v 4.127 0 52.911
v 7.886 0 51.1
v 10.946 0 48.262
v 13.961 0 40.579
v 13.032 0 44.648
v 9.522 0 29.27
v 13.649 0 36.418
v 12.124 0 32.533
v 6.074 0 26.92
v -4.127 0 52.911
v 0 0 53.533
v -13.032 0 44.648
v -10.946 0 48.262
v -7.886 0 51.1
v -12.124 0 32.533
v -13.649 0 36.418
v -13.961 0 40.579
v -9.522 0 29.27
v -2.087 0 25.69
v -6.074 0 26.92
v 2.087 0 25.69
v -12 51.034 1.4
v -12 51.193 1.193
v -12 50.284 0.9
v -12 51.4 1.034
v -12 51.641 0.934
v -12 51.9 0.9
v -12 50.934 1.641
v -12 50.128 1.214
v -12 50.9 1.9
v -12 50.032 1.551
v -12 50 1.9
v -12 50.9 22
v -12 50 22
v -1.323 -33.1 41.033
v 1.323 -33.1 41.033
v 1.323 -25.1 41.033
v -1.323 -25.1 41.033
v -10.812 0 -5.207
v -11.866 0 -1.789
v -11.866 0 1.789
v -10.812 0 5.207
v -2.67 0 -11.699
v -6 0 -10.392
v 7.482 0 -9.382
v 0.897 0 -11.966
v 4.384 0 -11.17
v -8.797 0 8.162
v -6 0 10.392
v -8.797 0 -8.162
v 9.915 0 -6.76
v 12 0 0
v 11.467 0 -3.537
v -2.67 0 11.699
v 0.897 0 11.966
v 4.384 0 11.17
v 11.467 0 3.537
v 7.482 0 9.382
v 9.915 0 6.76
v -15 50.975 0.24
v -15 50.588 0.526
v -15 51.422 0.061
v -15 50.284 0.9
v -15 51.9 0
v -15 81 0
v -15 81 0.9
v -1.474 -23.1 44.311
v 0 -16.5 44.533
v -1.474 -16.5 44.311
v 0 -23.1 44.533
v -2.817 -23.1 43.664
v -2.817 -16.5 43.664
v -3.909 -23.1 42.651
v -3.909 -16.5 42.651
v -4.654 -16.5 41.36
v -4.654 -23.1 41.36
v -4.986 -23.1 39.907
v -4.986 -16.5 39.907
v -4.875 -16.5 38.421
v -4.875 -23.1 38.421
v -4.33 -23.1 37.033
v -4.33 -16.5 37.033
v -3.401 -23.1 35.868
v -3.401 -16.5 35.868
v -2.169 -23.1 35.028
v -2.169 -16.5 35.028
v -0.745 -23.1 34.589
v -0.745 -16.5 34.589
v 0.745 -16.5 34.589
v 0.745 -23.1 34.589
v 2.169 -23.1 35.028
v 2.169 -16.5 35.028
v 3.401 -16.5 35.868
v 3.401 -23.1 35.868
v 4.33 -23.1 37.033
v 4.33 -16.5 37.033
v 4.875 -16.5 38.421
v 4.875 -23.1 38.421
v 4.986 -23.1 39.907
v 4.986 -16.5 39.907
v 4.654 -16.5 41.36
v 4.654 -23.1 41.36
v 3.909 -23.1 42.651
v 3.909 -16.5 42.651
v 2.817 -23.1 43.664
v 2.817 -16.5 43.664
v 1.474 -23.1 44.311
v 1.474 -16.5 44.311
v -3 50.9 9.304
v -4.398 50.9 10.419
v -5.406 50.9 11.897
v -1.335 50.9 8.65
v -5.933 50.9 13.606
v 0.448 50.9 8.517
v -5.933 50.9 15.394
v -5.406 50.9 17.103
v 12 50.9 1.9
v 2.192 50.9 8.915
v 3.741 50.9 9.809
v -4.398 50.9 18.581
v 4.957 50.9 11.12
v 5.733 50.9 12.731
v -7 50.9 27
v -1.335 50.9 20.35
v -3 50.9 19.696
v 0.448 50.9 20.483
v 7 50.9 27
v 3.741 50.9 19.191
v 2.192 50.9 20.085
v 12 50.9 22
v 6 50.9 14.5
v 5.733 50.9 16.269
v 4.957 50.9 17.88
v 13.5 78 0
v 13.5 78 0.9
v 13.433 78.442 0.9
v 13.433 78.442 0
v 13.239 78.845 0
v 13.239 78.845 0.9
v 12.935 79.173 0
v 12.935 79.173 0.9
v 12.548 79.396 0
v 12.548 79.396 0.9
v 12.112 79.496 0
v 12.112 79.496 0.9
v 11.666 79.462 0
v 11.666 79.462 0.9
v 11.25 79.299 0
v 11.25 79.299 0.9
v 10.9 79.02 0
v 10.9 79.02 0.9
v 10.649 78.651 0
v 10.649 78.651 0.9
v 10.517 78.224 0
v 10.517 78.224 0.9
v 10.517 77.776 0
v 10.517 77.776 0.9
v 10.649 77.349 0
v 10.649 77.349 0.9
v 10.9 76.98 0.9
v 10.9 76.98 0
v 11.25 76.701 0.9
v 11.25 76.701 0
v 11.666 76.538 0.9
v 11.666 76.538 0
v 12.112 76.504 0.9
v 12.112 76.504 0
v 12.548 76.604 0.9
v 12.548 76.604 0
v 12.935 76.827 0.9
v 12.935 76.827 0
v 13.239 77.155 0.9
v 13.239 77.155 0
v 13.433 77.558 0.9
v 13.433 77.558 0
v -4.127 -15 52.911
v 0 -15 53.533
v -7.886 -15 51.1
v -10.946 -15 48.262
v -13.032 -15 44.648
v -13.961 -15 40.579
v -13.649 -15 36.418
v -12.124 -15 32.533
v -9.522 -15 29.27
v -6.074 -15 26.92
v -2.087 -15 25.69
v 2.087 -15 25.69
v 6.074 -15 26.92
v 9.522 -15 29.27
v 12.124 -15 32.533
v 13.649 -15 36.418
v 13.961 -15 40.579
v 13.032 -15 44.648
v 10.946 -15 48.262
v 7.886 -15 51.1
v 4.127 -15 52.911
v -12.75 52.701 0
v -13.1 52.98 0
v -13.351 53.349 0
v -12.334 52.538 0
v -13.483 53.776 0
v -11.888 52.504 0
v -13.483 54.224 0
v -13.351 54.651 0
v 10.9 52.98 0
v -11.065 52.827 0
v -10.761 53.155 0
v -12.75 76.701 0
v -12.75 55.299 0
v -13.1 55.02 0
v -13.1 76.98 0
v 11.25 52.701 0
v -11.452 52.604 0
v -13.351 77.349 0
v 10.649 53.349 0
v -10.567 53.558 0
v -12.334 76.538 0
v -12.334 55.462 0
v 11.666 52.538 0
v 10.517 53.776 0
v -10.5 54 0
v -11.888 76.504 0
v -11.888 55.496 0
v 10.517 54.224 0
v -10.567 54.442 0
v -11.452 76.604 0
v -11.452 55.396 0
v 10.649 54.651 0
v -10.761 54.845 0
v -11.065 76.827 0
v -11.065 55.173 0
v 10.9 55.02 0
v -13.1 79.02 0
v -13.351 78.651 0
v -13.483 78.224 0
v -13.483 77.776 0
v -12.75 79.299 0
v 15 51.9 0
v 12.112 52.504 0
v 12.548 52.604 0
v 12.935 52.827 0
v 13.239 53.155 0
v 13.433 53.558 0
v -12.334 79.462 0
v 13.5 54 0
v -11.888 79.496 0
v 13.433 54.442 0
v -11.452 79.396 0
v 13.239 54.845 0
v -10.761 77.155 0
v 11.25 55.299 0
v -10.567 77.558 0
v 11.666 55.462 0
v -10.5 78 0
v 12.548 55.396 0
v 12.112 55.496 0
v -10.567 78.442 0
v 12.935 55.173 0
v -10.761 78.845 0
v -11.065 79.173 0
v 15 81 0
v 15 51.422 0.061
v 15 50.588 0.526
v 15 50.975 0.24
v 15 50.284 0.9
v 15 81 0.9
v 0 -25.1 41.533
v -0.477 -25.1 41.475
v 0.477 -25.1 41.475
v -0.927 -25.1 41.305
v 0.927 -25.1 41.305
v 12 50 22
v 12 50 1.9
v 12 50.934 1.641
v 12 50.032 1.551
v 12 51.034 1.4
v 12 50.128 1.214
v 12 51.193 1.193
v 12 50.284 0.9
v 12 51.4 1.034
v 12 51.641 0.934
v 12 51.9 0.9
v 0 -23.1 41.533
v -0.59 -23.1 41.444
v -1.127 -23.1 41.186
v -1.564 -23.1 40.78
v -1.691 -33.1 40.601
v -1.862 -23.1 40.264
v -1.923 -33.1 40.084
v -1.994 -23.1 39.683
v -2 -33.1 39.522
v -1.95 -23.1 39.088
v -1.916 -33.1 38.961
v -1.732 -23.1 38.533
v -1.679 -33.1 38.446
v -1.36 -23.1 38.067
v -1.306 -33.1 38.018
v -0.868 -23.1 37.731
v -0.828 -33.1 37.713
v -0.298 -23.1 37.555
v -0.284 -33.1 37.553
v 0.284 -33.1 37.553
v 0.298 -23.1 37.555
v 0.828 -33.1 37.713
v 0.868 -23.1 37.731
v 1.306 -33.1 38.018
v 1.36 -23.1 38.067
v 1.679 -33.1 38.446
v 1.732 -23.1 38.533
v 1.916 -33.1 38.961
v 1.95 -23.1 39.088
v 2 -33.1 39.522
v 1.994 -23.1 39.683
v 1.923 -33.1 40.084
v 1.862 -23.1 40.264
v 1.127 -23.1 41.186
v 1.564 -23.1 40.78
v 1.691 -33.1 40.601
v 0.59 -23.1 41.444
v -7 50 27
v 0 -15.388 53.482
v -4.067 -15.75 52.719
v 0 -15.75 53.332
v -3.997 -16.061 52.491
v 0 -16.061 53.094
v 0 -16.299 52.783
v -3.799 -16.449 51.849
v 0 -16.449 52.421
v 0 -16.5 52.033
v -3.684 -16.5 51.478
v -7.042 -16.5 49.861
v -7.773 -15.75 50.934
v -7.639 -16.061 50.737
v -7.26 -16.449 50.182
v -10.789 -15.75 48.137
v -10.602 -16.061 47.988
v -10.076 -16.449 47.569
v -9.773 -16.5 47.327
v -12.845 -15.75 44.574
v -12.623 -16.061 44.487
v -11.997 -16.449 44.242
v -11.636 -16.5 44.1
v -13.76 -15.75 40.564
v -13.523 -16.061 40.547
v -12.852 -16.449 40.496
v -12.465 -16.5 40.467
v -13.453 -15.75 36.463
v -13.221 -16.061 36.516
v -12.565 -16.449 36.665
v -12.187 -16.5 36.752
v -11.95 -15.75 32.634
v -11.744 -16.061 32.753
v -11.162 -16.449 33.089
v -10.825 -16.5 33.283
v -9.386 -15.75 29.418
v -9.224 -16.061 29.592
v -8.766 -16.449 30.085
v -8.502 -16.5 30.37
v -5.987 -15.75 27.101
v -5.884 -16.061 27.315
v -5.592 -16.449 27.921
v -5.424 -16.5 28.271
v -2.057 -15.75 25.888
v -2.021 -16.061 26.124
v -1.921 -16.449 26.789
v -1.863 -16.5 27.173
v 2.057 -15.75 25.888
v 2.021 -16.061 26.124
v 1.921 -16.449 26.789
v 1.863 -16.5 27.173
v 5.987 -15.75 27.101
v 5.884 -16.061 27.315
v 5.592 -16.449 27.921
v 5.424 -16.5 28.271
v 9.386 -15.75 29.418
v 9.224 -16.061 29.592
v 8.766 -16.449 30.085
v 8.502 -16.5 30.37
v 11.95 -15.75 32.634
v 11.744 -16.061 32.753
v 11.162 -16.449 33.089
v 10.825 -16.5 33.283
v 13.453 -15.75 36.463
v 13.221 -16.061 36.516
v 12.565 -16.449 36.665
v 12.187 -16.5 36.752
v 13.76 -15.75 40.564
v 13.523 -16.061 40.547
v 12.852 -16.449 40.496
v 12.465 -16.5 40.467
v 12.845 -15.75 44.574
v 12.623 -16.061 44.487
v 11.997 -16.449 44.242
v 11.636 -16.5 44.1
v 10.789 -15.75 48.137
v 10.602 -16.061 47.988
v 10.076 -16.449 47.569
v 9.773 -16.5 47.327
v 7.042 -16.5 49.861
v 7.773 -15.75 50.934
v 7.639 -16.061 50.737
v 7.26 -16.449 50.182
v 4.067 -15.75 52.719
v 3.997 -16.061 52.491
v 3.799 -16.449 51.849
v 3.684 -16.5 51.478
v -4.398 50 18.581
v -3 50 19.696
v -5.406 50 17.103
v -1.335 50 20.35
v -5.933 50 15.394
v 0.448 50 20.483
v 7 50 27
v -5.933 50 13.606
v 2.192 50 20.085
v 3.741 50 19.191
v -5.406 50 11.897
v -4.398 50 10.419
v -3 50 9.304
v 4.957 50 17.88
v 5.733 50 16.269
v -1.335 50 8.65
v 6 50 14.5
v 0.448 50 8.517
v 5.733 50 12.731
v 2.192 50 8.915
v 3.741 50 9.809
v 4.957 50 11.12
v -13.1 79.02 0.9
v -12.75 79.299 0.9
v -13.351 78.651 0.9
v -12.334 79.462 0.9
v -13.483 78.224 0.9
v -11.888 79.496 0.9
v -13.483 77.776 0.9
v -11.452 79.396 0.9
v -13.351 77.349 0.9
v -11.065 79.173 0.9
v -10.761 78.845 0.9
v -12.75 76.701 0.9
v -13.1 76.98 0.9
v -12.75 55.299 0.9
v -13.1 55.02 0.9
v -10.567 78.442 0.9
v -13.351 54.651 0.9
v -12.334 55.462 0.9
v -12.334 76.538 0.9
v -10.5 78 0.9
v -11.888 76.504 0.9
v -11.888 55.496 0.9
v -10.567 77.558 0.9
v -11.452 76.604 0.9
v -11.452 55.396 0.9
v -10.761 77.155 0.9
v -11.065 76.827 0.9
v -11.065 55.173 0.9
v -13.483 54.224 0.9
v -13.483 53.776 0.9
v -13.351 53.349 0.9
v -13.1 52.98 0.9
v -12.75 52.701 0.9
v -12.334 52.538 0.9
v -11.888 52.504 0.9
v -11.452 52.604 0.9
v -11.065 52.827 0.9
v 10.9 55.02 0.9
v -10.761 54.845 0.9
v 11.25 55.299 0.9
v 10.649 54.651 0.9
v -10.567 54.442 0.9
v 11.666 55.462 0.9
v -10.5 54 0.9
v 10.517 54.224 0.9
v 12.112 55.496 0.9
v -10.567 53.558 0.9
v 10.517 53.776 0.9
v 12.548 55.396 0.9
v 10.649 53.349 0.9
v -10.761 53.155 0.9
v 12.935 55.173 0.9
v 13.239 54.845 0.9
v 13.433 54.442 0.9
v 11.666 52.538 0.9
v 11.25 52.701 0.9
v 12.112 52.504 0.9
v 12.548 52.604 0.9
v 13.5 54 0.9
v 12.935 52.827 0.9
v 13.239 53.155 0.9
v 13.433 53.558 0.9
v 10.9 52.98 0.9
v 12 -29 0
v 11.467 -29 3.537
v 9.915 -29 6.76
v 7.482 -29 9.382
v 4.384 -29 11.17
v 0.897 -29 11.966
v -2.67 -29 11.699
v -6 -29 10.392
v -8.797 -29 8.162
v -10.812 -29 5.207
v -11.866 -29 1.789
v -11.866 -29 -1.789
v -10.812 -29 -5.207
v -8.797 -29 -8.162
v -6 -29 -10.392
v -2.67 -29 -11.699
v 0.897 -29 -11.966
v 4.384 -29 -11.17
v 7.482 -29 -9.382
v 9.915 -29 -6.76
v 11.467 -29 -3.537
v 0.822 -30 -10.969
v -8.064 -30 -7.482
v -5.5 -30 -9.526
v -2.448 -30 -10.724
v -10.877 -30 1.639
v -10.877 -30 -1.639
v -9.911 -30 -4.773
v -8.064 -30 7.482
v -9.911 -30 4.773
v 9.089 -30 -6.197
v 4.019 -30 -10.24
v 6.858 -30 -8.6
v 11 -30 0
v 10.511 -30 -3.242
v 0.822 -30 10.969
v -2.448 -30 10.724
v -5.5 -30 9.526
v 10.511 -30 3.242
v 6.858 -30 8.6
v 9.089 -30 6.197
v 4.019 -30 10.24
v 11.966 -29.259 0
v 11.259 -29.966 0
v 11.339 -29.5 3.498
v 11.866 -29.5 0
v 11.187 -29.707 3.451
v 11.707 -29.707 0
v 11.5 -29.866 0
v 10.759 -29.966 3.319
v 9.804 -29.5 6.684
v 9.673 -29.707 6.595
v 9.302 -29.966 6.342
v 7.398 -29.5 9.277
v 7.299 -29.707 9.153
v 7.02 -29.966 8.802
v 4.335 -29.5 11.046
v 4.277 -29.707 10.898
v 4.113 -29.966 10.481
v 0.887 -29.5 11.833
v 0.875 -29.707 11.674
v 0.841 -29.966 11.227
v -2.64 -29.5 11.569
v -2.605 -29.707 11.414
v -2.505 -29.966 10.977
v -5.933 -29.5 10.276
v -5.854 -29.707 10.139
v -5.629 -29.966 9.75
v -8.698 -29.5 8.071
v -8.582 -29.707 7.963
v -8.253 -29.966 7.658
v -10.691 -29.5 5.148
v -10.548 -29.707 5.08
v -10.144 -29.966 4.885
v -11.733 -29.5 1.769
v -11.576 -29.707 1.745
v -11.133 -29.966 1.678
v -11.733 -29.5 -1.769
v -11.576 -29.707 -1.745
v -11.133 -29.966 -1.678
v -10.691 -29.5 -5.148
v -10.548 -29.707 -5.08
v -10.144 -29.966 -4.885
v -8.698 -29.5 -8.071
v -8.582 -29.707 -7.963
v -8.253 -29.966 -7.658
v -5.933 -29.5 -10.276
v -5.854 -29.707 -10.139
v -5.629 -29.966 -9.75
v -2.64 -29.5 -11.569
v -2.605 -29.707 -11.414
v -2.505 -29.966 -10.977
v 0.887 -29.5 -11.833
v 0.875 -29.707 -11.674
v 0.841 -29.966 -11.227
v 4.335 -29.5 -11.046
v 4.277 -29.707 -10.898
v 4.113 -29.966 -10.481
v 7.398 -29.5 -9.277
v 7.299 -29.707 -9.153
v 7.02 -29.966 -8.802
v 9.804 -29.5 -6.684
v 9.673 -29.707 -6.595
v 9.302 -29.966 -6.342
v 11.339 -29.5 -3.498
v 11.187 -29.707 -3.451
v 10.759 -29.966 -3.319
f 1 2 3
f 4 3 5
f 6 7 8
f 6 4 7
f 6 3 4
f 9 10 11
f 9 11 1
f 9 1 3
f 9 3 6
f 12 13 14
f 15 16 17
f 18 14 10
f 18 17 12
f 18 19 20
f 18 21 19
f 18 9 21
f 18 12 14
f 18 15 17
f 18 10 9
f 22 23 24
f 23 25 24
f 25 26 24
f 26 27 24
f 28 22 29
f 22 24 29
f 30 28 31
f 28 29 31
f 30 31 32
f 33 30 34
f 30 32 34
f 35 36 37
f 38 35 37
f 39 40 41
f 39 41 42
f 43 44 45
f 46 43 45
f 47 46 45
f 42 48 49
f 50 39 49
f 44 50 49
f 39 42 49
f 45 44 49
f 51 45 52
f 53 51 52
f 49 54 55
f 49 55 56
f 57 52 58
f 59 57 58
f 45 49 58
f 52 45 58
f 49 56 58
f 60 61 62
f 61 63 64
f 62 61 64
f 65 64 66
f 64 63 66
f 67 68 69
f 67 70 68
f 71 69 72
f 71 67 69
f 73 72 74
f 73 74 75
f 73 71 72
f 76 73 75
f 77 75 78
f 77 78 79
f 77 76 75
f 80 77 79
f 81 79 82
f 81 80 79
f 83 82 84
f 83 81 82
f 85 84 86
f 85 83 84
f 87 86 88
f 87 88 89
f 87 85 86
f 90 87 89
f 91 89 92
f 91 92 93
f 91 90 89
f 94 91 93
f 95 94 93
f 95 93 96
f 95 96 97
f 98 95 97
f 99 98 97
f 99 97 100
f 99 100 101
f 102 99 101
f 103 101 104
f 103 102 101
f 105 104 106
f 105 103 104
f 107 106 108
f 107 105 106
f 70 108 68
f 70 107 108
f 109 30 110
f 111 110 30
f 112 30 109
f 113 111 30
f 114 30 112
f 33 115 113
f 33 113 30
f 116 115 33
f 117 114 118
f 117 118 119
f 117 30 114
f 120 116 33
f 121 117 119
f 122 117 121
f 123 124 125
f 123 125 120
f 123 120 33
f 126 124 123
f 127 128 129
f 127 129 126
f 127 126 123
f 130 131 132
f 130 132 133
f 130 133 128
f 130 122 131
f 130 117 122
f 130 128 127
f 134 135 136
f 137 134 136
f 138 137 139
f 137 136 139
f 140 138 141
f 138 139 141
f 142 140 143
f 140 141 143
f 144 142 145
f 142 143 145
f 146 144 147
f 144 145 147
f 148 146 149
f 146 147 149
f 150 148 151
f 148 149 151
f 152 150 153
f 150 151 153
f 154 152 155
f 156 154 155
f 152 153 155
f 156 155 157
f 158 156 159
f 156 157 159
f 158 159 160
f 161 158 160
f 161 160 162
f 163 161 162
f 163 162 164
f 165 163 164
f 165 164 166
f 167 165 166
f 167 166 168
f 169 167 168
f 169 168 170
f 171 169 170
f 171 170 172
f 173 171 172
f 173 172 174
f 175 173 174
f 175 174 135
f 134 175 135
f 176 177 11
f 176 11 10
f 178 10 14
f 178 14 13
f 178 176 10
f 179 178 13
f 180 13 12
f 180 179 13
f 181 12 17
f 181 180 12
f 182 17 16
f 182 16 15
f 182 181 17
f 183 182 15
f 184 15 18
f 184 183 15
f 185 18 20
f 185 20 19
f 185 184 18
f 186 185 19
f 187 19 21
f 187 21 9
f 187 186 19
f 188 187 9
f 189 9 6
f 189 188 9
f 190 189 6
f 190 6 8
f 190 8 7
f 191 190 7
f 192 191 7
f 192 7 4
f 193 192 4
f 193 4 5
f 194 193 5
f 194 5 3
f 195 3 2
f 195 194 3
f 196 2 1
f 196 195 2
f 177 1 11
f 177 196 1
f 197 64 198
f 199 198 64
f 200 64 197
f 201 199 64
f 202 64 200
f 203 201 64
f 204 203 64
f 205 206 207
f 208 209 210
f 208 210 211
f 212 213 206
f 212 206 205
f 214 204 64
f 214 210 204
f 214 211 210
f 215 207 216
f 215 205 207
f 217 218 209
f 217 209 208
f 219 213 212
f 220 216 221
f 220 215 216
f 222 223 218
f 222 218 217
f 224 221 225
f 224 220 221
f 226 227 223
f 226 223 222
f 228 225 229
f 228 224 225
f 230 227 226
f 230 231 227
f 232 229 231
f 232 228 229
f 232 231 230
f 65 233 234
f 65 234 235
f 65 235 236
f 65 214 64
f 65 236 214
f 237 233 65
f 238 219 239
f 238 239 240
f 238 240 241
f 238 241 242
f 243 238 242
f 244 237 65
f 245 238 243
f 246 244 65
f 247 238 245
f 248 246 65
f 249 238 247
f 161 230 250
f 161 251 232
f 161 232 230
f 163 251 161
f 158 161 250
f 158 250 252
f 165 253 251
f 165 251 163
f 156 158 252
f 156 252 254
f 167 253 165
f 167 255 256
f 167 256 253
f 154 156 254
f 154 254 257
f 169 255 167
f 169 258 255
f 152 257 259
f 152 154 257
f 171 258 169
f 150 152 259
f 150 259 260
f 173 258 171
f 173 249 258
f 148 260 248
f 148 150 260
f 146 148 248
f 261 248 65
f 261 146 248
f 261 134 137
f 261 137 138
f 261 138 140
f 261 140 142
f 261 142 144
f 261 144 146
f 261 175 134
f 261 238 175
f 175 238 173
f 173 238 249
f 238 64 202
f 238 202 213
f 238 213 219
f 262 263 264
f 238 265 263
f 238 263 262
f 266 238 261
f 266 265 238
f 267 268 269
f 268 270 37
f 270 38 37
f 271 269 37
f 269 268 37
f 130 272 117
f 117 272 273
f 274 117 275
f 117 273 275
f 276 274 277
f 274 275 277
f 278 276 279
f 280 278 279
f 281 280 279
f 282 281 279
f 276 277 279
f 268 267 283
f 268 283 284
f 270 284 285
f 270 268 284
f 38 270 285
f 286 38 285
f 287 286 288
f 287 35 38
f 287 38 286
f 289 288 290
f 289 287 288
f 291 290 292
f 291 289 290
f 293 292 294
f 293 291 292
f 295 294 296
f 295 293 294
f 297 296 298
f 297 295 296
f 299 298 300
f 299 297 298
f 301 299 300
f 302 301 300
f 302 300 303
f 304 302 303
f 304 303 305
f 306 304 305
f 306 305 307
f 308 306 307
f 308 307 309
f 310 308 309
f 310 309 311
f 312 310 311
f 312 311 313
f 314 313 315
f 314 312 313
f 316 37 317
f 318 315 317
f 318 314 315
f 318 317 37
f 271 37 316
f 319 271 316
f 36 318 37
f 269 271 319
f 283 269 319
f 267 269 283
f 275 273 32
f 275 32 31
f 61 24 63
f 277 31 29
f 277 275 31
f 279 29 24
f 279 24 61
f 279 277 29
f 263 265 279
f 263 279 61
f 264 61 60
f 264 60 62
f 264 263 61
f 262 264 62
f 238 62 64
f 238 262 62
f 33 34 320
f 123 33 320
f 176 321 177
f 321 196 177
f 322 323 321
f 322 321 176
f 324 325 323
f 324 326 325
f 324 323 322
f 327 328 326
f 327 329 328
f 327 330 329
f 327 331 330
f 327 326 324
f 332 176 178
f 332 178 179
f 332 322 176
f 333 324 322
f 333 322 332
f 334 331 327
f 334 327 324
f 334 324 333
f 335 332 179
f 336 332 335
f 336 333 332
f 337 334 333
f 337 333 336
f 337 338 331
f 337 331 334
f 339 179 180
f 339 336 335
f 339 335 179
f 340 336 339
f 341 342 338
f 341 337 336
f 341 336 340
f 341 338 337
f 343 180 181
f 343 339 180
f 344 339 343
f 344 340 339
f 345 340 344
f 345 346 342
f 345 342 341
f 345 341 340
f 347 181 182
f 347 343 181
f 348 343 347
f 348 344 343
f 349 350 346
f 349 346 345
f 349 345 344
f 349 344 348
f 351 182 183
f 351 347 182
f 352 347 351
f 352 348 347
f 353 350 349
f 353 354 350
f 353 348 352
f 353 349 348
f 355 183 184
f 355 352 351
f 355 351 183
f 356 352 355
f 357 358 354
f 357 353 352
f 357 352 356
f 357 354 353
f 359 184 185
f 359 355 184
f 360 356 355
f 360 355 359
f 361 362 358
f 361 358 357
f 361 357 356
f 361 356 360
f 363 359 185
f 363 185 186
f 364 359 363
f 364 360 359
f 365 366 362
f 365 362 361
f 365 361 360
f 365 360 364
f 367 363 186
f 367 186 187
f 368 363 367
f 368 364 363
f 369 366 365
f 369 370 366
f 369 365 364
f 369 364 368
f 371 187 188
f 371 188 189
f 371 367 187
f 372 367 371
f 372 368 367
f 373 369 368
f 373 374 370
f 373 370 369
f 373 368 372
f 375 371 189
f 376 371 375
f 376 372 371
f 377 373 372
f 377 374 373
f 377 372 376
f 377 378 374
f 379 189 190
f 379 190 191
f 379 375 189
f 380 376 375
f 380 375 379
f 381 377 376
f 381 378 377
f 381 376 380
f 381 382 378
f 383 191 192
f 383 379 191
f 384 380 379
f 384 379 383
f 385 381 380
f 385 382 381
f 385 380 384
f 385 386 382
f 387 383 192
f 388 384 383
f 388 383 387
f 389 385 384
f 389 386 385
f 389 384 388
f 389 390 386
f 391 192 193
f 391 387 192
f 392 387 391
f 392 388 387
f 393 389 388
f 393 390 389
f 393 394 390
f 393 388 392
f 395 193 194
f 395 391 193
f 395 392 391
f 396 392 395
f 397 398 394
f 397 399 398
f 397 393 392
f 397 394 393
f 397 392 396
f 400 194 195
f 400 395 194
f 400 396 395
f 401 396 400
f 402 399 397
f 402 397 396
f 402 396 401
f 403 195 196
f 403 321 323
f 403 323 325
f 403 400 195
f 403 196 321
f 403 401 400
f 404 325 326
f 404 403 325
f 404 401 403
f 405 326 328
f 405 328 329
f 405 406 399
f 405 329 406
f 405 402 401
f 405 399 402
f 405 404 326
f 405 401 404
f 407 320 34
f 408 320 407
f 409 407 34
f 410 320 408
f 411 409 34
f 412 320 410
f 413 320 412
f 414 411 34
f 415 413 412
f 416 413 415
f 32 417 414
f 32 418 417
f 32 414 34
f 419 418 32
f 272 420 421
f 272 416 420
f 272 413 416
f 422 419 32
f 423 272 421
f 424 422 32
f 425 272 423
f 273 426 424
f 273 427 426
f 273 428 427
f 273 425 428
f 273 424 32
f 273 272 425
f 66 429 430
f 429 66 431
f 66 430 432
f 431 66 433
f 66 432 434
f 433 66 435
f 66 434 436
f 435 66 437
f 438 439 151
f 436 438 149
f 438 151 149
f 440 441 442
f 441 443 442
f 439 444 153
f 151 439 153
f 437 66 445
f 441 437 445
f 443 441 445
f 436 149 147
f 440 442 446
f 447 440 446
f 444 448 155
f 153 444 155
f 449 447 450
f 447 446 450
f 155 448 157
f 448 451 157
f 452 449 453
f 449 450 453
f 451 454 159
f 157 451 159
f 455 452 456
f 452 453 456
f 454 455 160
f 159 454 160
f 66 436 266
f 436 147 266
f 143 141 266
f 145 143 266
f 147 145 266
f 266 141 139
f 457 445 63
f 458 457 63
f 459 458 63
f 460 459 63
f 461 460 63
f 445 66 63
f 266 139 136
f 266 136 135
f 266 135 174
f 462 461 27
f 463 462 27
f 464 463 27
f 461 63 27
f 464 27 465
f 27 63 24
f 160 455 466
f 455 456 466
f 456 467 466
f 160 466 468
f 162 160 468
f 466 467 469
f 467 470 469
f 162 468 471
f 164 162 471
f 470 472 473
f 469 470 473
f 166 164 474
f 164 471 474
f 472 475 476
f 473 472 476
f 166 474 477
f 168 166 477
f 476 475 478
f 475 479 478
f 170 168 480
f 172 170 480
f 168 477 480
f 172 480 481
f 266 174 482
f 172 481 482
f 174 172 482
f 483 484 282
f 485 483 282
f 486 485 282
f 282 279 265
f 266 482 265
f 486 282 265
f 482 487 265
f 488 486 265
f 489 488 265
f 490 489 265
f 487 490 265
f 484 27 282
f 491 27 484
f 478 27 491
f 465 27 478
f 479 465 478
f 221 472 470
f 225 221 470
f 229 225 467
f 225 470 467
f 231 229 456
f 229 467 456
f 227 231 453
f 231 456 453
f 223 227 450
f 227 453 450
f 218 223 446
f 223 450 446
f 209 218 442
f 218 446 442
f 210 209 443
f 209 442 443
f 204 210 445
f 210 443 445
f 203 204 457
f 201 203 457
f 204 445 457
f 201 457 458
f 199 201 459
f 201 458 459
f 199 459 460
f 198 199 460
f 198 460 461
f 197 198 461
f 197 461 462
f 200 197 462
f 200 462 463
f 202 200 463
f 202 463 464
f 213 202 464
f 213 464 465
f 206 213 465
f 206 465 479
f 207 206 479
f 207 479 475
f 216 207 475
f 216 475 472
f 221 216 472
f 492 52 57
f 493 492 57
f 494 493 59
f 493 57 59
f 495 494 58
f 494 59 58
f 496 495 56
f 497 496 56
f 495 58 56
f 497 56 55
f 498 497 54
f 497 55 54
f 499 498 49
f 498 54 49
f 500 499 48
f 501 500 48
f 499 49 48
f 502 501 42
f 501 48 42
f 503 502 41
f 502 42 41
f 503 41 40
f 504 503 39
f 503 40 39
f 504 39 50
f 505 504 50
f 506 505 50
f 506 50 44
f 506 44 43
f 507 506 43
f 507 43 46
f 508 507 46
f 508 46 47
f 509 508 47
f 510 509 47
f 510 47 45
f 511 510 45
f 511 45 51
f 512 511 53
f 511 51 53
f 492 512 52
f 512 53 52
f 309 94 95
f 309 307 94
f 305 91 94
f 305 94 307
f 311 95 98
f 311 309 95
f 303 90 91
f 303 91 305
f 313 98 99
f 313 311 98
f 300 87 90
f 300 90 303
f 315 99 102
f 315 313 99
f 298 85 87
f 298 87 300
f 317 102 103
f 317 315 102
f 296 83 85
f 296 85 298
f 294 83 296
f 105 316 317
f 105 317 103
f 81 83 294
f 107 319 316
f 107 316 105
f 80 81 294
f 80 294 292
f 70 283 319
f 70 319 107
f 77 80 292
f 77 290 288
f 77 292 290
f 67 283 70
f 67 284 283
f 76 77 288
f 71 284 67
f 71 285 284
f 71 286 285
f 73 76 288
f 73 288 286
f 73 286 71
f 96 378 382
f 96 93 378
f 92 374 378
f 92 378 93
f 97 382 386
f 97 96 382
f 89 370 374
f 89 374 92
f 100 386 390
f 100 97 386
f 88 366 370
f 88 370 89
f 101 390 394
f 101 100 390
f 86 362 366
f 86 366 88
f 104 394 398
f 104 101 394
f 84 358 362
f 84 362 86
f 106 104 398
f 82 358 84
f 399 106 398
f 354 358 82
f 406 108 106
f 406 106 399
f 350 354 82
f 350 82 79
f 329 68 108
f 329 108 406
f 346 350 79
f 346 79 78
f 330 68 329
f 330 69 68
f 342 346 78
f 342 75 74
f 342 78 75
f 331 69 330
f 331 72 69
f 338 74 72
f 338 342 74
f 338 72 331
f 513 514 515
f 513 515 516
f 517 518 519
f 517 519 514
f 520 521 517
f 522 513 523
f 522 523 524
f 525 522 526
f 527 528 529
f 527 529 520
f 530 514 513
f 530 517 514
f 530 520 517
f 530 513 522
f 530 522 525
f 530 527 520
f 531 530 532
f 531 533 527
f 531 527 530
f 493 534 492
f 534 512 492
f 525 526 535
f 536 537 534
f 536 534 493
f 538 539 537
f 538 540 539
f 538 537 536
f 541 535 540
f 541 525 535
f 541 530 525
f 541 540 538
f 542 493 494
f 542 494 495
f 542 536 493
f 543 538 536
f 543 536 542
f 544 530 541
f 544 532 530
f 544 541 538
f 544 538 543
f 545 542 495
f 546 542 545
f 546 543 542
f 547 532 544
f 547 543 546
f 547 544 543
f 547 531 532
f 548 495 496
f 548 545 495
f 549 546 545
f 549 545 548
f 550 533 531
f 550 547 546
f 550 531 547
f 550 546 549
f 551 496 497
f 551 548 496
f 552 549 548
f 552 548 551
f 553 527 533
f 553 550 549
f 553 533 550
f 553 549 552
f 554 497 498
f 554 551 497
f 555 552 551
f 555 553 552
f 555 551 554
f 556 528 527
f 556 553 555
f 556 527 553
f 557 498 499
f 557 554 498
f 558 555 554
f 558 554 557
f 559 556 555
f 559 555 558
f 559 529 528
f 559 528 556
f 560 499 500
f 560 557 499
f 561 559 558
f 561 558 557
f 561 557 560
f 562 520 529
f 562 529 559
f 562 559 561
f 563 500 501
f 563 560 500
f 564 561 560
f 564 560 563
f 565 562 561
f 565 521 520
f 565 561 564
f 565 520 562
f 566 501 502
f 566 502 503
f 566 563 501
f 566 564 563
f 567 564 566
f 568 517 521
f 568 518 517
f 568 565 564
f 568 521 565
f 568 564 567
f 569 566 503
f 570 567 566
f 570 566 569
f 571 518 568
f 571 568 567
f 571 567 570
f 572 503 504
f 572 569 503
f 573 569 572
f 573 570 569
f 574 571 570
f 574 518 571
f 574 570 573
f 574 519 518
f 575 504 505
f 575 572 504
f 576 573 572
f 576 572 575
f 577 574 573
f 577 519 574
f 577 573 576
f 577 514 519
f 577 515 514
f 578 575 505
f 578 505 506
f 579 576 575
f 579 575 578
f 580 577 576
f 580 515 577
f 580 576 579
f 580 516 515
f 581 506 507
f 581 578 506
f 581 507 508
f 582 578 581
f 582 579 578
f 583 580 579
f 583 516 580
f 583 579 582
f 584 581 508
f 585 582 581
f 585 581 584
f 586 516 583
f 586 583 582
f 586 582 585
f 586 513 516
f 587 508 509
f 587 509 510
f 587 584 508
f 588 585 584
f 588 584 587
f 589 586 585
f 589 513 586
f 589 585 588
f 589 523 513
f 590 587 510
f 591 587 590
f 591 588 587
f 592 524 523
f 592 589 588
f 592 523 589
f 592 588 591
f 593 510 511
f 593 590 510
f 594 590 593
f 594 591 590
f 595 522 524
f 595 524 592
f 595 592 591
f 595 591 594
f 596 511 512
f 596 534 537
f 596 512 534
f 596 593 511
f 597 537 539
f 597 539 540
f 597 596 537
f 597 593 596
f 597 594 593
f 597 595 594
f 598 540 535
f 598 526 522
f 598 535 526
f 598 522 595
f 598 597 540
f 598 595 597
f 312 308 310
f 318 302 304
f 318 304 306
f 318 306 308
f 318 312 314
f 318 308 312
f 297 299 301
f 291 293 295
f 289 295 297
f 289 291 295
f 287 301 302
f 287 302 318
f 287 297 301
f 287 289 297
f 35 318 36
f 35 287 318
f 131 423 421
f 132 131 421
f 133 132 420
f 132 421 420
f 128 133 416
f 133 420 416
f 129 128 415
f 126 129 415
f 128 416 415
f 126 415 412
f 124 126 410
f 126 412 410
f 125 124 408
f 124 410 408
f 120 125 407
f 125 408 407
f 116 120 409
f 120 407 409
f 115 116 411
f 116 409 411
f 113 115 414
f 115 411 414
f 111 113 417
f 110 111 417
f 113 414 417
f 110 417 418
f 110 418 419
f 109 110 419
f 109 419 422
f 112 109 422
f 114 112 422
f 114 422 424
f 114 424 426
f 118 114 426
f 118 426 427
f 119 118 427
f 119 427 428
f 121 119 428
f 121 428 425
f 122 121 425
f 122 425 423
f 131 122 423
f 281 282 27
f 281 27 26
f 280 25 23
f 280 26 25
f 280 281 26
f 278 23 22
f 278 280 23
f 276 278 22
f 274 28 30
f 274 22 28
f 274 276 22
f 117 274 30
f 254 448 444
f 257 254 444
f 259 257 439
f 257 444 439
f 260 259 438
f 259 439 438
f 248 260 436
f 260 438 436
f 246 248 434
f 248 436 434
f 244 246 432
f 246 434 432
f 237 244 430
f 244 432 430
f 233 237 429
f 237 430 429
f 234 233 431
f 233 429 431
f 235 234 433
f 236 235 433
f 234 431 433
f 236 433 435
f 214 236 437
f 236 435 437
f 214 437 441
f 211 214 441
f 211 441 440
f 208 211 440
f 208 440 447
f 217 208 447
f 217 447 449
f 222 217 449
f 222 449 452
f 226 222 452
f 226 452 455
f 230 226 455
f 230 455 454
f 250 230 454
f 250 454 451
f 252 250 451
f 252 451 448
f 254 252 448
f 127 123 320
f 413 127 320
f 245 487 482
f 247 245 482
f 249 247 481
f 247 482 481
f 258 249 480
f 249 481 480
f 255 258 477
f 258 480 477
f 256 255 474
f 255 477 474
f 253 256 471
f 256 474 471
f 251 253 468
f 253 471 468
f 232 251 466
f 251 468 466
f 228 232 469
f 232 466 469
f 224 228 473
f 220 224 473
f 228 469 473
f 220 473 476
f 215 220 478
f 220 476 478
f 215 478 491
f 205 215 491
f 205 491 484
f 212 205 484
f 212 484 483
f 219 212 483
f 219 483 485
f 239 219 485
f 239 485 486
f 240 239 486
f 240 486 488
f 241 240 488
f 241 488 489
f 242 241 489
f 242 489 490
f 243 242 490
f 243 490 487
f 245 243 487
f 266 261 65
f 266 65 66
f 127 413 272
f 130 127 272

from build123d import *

# Parameters (mm, degrees)
F0_R      = 12
F1_DEPTH  = 30
F2_R      = 1
F4_DEPTH  = 15
F5_R      = 1.5
F6_DEPTH  = 12.901
F7_W      = 3
F7_H      = 1
F7_R      = 6
F8_DEPTH  = 31.001
F10_W     = 8
F10_H     = 0.5
F11_DEPTH = 12.5
F12_R     = 1.5


with BuildPart() as f1:
    # F0 (on Front) → F1 (new body)
    with BuildSketch(Plane.XZ):
        Circle(F0_R)
    extrude(amount=F1_DEPTH)

    # F2
    f2_edges = [f1.edges().sort_by_distance(p)[0] for p in [
        (-12, -30, 0),
    ]]
    fillet(f2_edges, radius=F2_R)


with BuildPart() as f4:
    # F3 (on Right) → F4 (new body, symmetric)
    with BuildSketch(Plane.YZ):
        with BuildLine():
            Line((51.9, 0), (81, 0))
            Line((81, 0), (81, 0.9))
            Line((81, 0.9), (51.9, 0.9))
            ThreePointArc((51.9, 0.9), (51.1928932188, 1.1928932188), (50.9, 1.9))
            Line((50.9, 1.9), (50.9, 27))
            Line((50.9, 27), (50, 27))
            Line((50, 27), (50, 1.9))
            ThreePointArc((50, 1.9), (50.5564971157, 0.5564971157), (51.9, 0))
        make_face()
    extrude(amount=F4_DEPTH, both=True)

    # F5 (on face) → F6 (cut, through all)
    with BuildSketch(Plane.XY.offset(0.9)):
        with Locations((-12, 78)):
            Circle(F5_R)
        with Locations((12, 78)):
            Circle(F5_R)
        with Locations((-12, 54)):
            Circle(F5_R)
        with Locations((12, 54)):
            Circle(F5_R)
    extrude(amount=-F6_DEPTH, mode=Mode.SUBTRACT)

    # F7 (on face) → F8 (cut, through all)
    with BuildSketch(Plane.XZ.offset(-50)):
        Polygon((-7, 27), (-15, 27), (-15, 1.9), (-12, 1.9), (-12, 22), align=None)
        Polygon((15, 27), (7, 27), (12, 22), (12, 1.9), (15, 1.9), align=None)
        with Locations((-13.5, 1.4)):
            Rectangle(F7_W, F7_H)
        with Locations((13.5, 1.4)):
            Rectangle(F7_W, F7_H)
        with Locations((0, 14.5)):
            Circle(F7_R)
    extrude(amount=-F8_DEPTH, mode=Mode.SUBTRACT)


with BuildPart() as f9:
    # F3 (on Right) → F9 (revolve)
    with BuildSketch(Plane.YZ):
        Polygon((-33.1, 39.5331345499), (0, 39.5331345499), (0, 53.5331345499), (-16.5, 53.5331345499), (-16.5, 44.5331345499), (-23.1, 44.5331345499), (-23.1, 41.5331345499), (-33.1, 41.5331345499), align=None)
    revolve(axis=Axis((0, -16.55, 39.5331345499), (0, -1, 0)))

    # F10 (on Right) → F11 (cut, symmetric)
    with BuildSketch(Plane.YZ):
        with Locations((-29.1, 41.2831345499)):
            Rectangle(F10_W, F10_H)
    extrude(amount=F11_DEPTH, both=True, mode=Mode.SUBTRACT)

    # F12
    f12_edges = [f9.edges().sort_by_distance(p)[0] for p in [
        (0, -16.5, 25.533135),
    ]]
    fillet(f12_edges, radius=F12_R)


solid = Compound([f1.part, f4.part, f9.part])
